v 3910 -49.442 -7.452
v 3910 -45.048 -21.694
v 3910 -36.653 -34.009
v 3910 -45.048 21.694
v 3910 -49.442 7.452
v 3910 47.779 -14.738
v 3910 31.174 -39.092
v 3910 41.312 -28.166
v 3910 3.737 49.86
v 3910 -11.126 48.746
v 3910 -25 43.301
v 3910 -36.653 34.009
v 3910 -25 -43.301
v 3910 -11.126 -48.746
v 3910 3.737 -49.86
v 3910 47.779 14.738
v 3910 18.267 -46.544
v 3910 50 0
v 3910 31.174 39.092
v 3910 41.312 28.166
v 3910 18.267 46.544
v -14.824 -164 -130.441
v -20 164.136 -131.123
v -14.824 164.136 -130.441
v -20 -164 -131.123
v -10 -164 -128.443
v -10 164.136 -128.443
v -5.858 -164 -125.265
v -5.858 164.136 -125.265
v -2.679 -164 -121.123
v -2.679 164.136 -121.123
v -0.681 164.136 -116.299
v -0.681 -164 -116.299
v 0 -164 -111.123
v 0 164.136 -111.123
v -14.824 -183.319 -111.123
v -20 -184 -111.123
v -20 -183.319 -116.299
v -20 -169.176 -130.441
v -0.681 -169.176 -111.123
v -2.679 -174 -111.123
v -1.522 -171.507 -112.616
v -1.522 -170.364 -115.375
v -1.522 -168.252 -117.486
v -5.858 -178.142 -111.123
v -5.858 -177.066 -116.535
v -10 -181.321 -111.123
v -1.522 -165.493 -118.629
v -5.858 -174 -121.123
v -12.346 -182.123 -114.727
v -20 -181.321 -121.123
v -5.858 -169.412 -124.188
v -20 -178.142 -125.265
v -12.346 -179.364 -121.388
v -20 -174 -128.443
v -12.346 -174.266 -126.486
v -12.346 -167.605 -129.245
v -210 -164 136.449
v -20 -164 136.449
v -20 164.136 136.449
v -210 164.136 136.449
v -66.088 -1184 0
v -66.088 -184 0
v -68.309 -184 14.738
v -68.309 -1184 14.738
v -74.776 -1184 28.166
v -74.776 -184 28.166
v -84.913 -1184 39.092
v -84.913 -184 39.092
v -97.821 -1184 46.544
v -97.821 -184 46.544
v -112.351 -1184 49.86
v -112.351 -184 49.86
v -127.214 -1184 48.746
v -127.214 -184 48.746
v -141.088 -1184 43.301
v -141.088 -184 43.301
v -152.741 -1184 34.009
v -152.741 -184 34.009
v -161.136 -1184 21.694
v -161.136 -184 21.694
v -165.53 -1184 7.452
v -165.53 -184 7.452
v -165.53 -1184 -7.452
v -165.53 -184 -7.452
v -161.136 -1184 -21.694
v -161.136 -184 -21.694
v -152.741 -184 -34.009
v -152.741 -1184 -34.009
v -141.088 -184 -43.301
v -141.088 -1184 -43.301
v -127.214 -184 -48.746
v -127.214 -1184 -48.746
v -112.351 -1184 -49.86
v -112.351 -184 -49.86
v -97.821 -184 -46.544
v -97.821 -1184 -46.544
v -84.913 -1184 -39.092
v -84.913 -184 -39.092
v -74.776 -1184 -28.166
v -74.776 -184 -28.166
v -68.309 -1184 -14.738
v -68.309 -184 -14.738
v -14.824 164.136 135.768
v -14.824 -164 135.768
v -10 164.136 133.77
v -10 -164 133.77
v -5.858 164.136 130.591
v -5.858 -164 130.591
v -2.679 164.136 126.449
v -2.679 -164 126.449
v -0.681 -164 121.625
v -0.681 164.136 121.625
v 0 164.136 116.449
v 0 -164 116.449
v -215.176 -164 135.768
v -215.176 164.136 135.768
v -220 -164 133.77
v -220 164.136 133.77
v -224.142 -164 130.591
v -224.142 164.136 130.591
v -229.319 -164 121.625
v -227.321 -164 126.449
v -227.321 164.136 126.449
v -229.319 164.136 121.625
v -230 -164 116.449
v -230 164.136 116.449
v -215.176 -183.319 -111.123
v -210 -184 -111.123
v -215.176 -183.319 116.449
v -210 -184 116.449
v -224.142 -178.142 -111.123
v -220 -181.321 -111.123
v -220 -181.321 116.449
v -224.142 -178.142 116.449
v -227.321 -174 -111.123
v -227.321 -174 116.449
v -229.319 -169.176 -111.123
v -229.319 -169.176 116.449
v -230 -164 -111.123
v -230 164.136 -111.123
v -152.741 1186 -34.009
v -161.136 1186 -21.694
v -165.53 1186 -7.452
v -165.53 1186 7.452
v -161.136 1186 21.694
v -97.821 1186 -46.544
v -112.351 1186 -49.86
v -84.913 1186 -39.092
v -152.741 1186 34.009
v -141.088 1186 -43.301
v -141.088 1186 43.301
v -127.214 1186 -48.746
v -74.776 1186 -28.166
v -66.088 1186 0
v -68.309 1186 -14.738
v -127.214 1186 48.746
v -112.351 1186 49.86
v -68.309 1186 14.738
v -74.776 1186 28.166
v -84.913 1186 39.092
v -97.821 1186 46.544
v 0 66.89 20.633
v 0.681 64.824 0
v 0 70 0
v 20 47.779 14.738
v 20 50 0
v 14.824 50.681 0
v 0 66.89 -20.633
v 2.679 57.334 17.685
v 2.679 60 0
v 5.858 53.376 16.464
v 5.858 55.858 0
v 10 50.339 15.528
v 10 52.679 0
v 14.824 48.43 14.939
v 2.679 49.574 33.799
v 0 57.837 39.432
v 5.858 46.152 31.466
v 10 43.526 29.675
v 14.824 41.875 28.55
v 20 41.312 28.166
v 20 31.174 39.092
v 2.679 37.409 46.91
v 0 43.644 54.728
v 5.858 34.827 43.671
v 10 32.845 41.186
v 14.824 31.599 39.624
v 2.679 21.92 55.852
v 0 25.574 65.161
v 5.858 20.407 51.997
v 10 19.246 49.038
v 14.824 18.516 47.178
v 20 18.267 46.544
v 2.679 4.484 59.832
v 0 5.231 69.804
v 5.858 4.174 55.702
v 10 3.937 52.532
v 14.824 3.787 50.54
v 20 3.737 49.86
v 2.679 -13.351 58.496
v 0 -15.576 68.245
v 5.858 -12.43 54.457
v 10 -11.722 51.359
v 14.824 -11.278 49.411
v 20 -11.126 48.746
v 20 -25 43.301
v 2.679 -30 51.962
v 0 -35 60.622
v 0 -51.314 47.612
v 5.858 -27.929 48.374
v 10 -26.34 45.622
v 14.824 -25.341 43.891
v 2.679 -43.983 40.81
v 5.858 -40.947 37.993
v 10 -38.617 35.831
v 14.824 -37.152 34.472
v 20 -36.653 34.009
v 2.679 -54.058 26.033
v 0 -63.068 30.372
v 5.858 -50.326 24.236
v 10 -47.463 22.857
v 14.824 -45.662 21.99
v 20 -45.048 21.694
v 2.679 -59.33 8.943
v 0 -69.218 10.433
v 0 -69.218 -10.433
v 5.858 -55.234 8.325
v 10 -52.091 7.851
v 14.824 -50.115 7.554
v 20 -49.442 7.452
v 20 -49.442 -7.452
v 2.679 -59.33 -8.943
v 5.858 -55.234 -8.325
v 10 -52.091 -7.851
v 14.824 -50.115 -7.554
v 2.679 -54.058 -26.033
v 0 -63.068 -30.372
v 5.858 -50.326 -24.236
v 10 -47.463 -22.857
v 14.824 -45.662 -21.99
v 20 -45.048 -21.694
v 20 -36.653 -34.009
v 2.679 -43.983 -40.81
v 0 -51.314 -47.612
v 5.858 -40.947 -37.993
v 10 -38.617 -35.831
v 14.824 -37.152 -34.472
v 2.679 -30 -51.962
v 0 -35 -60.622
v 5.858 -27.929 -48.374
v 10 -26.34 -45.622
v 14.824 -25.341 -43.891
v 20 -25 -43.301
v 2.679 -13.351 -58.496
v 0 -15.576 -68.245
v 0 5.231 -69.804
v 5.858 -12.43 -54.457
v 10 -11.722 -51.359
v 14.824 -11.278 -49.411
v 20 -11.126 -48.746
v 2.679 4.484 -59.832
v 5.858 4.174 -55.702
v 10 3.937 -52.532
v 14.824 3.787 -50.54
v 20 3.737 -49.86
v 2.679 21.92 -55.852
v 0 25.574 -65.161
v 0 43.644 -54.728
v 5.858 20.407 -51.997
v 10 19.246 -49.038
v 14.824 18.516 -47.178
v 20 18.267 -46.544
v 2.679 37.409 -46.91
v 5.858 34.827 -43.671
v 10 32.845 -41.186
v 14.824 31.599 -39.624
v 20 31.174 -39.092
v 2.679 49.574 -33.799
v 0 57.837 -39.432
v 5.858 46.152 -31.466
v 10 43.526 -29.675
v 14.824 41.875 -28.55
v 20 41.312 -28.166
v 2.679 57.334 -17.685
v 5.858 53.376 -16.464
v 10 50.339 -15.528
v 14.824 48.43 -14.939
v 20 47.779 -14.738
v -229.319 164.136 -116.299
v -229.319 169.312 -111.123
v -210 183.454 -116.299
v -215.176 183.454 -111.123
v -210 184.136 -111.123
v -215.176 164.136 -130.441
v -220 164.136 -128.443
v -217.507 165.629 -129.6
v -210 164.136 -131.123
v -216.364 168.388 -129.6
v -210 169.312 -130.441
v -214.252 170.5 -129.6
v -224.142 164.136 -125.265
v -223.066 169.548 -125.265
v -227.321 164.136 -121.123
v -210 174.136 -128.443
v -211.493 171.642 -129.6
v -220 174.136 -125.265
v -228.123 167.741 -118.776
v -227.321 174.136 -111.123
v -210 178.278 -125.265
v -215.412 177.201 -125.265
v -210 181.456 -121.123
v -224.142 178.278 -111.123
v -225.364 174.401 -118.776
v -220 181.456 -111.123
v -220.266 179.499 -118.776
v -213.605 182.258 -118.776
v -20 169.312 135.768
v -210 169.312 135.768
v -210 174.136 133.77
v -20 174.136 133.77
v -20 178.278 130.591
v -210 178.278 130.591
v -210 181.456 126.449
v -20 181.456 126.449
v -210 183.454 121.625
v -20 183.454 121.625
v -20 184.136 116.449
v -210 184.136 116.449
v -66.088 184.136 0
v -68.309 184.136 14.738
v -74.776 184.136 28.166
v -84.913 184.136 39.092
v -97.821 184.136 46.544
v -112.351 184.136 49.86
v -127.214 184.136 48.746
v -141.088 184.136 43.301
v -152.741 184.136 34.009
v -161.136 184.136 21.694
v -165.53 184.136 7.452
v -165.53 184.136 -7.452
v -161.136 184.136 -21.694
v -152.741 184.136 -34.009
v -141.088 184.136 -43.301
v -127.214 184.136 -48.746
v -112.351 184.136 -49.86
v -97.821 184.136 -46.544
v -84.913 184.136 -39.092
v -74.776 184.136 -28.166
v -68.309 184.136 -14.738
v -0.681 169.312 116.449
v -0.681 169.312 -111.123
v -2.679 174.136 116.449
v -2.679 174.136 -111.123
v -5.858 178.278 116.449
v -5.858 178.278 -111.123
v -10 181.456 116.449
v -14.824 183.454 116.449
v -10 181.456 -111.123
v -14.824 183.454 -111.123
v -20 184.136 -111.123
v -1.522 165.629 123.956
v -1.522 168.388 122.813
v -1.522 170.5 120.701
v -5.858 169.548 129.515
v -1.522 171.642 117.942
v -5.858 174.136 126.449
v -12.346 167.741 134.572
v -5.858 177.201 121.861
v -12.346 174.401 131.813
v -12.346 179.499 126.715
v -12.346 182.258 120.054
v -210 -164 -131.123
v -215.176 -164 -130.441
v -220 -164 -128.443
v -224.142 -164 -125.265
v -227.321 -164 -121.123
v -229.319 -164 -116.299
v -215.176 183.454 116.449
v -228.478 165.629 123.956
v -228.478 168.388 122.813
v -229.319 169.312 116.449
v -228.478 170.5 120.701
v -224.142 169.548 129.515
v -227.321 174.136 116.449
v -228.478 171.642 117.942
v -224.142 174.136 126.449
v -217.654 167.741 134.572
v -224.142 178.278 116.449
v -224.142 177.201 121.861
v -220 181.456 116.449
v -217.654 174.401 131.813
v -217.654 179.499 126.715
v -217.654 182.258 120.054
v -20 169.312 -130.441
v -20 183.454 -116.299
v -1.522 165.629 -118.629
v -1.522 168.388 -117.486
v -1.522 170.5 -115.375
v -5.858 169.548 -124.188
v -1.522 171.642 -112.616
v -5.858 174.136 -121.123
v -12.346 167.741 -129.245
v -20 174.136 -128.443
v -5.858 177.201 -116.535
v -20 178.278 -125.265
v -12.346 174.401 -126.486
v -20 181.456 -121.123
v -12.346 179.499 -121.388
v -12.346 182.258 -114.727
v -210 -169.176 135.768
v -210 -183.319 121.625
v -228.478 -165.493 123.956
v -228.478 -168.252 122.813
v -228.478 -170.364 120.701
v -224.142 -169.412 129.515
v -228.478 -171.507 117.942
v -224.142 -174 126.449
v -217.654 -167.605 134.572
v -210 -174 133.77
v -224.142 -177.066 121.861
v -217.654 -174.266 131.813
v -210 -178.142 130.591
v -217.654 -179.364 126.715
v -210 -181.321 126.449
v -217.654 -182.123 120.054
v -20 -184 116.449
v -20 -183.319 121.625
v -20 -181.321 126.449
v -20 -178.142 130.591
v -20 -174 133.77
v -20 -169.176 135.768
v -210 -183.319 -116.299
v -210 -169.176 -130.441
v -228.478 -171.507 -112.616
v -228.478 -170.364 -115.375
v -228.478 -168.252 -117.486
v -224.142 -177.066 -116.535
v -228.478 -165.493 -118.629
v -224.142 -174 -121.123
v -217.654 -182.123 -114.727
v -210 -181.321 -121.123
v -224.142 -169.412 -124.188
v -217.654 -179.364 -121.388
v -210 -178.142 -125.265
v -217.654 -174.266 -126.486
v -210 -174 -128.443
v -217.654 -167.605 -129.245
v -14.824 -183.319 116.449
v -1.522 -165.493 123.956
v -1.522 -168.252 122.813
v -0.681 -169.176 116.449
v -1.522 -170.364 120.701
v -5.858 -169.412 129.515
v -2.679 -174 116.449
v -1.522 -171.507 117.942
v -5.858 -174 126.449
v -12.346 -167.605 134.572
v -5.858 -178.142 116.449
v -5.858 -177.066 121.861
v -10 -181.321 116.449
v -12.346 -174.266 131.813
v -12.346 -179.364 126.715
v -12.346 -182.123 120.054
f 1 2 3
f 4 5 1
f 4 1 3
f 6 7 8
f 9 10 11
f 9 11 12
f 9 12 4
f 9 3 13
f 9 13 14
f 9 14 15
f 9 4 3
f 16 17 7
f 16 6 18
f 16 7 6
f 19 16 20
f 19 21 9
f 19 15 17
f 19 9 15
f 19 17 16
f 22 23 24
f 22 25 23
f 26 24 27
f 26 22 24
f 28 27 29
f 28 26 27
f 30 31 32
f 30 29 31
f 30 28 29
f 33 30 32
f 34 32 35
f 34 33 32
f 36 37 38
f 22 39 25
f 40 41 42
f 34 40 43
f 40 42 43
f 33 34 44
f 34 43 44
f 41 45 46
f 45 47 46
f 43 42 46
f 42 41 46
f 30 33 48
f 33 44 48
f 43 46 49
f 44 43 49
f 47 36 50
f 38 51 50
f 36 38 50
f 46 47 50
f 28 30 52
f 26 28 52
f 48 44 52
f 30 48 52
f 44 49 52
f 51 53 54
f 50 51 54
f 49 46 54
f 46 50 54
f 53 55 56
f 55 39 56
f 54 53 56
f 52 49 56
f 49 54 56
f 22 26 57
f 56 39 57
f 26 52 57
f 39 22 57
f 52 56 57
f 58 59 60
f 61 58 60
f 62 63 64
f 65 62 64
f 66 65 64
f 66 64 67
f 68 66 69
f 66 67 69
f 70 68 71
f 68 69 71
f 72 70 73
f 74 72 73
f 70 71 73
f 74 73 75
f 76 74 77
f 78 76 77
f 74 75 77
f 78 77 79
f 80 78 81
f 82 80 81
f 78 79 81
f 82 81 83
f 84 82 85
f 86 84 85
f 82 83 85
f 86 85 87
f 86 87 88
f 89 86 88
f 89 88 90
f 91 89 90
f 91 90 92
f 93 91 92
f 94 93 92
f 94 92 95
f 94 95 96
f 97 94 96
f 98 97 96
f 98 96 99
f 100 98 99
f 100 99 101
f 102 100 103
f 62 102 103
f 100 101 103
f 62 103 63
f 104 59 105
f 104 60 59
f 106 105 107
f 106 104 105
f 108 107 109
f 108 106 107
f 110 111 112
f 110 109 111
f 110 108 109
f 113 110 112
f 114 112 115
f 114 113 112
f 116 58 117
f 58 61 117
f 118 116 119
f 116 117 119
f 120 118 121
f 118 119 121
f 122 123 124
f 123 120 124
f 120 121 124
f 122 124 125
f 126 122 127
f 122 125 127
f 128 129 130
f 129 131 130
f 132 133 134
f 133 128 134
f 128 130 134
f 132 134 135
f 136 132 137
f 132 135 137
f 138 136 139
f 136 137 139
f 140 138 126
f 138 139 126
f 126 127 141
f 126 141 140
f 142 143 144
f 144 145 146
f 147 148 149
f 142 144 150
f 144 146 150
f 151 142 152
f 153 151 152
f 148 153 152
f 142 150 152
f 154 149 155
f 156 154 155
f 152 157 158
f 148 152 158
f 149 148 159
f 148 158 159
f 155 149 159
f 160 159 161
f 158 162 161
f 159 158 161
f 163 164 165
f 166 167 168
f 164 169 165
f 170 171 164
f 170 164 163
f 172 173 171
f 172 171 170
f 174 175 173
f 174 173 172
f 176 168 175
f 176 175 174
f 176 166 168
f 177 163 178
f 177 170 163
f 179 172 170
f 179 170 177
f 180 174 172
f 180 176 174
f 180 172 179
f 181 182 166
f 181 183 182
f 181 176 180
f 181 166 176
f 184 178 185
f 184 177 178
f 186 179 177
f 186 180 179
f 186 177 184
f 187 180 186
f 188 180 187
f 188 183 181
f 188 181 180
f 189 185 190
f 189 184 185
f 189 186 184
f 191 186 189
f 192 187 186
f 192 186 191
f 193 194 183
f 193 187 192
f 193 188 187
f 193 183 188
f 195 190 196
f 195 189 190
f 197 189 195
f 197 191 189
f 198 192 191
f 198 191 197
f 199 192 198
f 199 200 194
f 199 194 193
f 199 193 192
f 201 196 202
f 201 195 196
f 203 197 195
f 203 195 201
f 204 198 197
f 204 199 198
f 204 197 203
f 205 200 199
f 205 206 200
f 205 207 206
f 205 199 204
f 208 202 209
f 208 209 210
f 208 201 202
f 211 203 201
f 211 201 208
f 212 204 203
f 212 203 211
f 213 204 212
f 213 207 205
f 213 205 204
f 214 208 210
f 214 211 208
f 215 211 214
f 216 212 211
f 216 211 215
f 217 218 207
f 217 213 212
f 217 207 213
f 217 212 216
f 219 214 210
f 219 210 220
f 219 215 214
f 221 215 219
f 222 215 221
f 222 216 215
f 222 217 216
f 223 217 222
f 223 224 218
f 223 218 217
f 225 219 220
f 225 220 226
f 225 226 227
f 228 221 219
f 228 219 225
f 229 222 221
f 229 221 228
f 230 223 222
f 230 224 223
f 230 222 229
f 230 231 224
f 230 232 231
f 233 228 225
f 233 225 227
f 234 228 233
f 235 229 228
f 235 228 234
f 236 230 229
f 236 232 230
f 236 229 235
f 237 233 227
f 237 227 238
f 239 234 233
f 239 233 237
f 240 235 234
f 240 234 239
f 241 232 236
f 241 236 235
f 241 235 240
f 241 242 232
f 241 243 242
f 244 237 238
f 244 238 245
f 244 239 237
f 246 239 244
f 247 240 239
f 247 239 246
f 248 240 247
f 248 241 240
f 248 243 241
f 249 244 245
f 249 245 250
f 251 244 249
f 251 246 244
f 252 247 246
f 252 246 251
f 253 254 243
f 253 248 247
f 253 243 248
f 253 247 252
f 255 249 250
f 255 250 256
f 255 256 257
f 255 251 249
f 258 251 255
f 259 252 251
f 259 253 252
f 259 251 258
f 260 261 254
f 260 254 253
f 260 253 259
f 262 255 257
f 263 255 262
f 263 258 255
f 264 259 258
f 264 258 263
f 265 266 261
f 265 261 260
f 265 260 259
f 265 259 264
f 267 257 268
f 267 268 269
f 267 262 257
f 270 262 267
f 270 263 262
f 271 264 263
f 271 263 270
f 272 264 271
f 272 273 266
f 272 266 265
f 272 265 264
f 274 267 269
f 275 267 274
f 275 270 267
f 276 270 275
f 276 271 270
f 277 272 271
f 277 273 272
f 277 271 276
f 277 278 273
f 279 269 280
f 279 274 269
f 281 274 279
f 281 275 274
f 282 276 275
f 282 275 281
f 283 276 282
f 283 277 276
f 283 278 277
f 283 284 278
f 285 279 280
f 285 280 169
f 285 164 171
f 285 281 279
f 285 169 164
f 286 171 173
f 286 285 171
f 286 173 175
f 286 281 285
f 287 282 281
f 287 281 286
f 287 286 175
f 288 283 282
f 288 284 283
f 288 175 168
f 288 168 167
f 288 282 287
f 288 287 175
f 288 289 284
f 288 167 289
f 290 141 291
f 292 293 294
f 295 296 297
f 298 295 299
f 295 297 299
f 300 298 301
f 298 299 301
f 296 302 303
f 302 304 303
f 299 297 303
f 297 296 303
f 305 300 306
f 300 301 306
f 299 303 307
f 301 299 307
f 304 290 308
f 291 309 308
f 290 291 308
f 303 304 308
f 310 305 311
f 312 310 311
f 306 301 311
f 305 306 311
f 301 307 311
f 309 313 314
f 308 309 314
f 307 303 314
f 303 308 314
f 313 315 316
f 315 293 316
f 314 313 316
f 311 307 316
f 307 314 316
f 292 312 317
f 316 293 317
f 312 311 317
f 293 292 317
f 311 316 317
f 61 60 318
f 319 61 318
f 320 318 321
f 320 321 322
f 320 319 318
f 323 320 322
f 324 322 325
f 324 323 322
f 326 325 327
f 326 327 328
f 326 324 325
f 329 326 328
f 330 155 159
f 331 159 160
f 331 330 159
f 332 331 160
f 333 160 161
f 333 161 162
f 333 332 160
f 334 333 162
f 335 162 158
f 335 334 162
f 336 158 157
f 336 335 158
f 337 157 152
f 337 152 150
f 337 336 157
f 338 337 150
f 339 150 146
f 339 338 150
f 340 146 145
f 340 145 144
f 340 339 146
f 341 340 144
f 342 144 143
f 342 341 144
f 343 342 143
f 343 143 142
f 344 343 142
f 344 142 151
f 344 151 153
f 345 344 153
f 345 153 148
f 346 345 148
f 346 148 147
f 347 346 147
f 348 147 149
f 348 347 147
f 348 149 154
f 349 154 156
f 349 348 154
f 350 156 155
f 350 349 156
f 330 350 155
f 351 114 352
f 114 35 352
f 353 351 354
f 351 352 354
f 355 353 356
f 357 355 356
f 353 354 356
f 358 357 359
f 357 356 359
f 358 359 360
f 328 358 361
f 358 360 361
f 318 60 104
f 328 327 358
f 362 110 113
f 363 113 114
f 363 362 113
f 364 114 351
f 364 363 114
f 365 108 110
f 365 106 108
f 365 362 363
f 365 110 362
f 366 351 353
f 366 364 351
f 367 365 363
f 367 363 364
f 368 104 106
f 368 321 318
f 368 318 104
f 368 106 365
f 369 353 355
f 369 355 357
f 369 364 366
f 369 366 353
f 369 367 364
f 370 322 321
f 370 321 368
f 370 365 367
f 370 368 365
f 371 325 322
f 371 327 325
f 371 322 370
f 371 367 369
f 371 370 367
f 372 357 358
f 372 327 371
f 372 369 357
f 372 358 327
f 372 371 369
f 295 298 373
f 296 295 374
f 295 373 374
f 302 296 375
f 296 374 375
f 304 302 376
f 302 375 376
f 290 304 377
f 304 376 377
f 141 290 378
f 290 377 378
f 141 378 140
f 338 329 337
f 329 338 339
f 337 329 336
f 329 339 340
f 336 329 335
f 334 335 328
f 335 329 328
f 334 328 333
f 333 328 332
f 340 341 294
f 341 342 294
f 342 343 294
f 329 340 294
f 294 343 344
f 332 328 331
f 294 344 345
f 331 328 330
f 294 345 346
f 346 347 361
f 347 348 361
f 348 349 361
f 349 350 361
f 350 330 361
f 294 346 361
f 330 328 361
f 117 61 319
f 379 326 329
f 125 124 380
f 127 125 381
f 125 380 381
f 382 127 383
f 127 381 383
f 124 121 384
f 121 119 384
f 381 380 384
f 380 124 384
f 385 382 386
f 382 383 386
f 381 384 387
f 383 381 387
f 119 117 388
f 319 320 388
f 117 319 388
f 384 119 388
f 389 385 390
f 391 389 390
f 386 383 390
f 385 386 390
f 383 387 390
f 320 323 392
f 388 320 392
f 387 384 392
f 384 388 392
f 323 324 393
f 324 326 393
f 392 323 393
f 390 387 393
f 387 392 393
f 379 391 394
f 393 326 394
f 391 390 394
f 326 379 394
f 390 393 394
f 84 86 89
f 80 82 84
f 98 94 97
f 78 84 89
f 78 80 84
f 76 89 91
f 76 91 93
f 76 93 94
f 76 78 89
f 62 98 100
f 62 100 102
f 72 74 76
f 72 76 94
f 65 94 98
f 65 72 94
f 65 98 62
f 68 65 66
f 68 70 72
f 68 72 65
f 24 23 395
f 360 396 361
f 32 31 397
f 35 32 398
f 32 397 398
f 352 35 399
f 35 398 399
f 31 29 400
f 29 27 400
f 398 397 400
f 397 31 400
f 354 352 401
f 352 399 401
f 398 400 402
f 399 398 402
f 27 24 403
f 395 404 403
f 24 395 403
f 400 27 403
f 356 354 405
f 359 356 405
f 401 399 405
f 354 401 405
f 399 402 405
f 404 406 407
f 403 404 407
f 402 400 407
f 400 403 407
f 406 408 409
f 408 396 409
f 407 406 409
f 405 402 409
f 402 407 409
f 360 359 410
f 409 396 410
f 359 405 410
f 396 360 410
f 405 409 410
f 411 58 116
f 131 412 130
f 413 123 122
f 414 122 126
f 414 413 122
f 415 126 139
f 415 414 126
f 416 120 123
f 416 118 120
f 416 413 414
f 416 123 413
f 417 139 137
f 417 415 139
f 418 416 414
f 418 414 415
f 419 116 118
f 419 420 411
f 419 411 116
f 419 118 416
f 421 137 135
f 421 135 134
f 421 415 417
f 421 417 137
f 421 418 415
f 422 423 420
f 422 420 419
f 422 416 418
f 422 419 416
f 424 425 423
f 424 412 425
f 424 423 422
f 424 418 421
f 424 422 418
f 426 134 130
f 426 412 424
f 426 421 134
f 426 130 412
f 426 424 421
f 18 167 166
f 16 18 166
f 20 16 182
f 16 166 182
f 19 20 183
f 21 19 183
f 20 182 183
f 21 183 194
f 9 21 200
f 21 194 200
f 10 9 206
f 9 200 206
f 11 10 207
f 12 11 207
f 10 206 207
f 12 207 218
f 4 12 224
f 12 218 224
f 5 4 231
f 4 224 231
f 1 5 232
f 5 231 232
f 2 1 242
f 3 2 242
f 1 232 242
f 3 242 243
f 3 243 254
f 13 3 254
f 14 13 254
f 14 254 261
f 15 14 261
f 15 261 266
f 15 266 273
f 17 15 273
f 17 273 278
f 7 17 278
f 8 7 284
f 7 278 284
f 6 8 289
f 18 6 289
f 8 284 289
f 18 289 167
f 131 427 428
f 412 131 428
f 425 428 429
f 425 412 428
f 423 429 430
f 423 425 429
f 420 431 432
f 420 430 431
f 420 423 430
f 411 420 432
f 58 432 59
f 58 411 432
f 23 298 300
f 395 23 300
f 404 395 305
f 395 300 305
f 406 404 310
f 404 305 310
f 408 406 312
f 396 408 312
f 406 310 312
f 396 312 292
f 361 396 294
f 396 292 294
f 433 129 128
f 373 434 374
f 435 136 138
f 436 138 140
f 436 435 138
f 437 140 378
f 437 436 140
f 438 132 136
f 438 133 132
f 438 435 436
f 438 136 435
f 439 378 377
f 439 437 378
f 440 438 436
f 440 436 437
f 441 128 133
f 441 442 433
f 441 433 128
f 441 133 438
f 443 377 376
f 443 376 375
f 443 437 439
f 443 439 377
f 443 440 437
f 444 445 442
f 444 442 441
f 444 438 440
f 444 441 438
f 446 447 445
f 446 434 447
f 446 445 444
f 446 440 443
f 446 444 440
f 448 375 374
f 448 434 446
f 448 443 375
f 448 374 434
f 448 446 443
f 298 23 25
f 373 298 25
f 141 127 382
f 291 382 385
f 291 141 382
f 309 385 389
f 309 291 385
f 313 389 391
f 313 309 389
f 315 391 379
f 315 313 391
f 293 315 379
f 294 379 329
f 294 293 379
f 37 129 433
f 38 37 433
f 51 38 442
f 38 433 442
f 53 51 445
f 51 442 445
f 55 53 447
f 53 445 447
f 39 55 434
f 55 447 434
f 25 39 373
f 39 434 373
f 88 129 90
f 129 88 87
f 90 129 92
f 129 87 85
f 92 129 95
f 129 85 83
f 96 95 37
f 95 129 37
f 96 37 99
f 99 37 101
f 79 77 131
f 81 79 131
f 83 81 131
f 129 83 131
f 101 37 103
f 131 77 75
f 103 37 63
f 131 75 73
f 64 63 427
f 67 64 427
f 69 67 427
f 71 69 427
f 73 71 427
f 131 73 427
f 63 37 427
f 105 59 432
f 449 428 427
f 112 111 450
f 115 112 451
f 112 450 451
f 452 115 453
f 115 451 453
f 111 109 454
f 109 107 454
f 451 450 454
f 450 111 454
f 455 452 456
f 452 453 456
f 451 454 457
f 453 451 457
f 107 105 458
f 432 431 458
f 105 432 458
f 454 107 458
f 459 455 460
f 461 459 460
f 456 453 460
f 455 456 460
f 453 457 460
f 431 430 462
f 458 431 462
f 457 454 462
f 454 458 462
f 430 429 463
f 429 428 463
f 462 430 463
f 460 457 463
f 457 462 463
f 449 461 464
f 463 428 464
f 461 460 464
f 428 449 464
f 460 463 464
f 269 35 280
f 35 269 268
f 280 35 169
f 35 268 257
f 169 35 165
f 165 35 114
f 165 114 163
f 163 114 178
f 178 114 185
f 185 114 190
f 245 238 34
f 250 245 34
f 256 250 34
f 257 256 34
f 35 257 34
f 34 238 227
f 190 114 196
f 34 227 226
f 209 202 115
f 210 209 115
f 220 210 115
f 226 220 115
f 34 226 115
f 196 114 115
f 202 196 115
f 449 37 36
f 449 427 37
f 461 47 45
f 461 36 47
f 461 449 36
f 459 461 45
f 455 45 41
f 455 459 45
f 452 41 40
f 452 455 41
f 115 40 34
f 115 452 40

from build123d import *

# Parameters (mm, degrees)
F0_R     = 50
F1_DEPTH = 3910
F3_DEPTH = 230
F4_R     = 20
F5_R     = 50
F6_DEPTH = 1000
F7_DEPTH = 1370
F8_DEPTH = 1000


with BuildPart() as f1:
    # F0 (on Right) → F1 (new body)
    with BuildSketch(Plane.YZ):
        Circle(F0_R)
    extrude(amount=F1_DEPTH)

    # F2 (on face) → F3 (join)
    with BuildSketch(Plane(origin=(0, 0, 0), x_dir=(0, -1, 0), z_dir=(-1, 0, 0))):
        Polygon((0, 8.0146994442), (0, 0), (0, -131.1225444078), (184, -131.1225444078), (184, 136.4490687847), (0, 136.4490687847), align=None)
        Polygon((0, -131.1225444078), (0, 0), (0, 8.0146994442), (0, 136.4490687847), (-184.1358691454, 136.4490687847), (-184.1358691454, -131.1225444078), align=None)
    extrude(amount=F3_DEPTH)

    # F4
    f4_edges = [f1.edges().sort_by_distance(p)[0] for p in [
        (-115, -184, 136.449069),
        (-115, 184.135869, 136.449069),
        (0, 0.067935, 136.449069),
        (-230, 0.067935, 136.449069),
        (-115, -184, -131.122544),
        (0, -184, 2.663262),
        (-230, -184, 2.663262),
        (-230, 184.135869, 2.663262),
        (-230, 0.067935, -131.122544),
        (-115, 184.135869, -131.122544),
        (0, 0.067935, -131.122544),
        (0, 184.135869, 2.663262),
        (0, -50, 0),
    ]]
    fillet(f4_edges, radius=F4_R)

    # F5 (on face) → F6 (join)
    with BuildSketch(Plane.XZ.offset(184)):
        with Locations((-116.0879656672, 0)):
            Circle(F5_R)
    extrude(amount=F6_DEPTH)

    # F7 (add): a face of the model
    f7_faces = [f1.faces().sort_by_distance(p)[0] for p in [
        (-116.0879656672, -1184, 0),
    ]]
    extrude(f7_faces, amount=-F7_DEPTH)

    # F8 (add): a face of the model
    f8_faces = [f1.faces().sort_by_distance(p)[0] for p in [
        (-116.0879656672, 186, 0),
    ]]
    extrude(f8_faces, amount=F8_DEPTH)


solid = f1.part
